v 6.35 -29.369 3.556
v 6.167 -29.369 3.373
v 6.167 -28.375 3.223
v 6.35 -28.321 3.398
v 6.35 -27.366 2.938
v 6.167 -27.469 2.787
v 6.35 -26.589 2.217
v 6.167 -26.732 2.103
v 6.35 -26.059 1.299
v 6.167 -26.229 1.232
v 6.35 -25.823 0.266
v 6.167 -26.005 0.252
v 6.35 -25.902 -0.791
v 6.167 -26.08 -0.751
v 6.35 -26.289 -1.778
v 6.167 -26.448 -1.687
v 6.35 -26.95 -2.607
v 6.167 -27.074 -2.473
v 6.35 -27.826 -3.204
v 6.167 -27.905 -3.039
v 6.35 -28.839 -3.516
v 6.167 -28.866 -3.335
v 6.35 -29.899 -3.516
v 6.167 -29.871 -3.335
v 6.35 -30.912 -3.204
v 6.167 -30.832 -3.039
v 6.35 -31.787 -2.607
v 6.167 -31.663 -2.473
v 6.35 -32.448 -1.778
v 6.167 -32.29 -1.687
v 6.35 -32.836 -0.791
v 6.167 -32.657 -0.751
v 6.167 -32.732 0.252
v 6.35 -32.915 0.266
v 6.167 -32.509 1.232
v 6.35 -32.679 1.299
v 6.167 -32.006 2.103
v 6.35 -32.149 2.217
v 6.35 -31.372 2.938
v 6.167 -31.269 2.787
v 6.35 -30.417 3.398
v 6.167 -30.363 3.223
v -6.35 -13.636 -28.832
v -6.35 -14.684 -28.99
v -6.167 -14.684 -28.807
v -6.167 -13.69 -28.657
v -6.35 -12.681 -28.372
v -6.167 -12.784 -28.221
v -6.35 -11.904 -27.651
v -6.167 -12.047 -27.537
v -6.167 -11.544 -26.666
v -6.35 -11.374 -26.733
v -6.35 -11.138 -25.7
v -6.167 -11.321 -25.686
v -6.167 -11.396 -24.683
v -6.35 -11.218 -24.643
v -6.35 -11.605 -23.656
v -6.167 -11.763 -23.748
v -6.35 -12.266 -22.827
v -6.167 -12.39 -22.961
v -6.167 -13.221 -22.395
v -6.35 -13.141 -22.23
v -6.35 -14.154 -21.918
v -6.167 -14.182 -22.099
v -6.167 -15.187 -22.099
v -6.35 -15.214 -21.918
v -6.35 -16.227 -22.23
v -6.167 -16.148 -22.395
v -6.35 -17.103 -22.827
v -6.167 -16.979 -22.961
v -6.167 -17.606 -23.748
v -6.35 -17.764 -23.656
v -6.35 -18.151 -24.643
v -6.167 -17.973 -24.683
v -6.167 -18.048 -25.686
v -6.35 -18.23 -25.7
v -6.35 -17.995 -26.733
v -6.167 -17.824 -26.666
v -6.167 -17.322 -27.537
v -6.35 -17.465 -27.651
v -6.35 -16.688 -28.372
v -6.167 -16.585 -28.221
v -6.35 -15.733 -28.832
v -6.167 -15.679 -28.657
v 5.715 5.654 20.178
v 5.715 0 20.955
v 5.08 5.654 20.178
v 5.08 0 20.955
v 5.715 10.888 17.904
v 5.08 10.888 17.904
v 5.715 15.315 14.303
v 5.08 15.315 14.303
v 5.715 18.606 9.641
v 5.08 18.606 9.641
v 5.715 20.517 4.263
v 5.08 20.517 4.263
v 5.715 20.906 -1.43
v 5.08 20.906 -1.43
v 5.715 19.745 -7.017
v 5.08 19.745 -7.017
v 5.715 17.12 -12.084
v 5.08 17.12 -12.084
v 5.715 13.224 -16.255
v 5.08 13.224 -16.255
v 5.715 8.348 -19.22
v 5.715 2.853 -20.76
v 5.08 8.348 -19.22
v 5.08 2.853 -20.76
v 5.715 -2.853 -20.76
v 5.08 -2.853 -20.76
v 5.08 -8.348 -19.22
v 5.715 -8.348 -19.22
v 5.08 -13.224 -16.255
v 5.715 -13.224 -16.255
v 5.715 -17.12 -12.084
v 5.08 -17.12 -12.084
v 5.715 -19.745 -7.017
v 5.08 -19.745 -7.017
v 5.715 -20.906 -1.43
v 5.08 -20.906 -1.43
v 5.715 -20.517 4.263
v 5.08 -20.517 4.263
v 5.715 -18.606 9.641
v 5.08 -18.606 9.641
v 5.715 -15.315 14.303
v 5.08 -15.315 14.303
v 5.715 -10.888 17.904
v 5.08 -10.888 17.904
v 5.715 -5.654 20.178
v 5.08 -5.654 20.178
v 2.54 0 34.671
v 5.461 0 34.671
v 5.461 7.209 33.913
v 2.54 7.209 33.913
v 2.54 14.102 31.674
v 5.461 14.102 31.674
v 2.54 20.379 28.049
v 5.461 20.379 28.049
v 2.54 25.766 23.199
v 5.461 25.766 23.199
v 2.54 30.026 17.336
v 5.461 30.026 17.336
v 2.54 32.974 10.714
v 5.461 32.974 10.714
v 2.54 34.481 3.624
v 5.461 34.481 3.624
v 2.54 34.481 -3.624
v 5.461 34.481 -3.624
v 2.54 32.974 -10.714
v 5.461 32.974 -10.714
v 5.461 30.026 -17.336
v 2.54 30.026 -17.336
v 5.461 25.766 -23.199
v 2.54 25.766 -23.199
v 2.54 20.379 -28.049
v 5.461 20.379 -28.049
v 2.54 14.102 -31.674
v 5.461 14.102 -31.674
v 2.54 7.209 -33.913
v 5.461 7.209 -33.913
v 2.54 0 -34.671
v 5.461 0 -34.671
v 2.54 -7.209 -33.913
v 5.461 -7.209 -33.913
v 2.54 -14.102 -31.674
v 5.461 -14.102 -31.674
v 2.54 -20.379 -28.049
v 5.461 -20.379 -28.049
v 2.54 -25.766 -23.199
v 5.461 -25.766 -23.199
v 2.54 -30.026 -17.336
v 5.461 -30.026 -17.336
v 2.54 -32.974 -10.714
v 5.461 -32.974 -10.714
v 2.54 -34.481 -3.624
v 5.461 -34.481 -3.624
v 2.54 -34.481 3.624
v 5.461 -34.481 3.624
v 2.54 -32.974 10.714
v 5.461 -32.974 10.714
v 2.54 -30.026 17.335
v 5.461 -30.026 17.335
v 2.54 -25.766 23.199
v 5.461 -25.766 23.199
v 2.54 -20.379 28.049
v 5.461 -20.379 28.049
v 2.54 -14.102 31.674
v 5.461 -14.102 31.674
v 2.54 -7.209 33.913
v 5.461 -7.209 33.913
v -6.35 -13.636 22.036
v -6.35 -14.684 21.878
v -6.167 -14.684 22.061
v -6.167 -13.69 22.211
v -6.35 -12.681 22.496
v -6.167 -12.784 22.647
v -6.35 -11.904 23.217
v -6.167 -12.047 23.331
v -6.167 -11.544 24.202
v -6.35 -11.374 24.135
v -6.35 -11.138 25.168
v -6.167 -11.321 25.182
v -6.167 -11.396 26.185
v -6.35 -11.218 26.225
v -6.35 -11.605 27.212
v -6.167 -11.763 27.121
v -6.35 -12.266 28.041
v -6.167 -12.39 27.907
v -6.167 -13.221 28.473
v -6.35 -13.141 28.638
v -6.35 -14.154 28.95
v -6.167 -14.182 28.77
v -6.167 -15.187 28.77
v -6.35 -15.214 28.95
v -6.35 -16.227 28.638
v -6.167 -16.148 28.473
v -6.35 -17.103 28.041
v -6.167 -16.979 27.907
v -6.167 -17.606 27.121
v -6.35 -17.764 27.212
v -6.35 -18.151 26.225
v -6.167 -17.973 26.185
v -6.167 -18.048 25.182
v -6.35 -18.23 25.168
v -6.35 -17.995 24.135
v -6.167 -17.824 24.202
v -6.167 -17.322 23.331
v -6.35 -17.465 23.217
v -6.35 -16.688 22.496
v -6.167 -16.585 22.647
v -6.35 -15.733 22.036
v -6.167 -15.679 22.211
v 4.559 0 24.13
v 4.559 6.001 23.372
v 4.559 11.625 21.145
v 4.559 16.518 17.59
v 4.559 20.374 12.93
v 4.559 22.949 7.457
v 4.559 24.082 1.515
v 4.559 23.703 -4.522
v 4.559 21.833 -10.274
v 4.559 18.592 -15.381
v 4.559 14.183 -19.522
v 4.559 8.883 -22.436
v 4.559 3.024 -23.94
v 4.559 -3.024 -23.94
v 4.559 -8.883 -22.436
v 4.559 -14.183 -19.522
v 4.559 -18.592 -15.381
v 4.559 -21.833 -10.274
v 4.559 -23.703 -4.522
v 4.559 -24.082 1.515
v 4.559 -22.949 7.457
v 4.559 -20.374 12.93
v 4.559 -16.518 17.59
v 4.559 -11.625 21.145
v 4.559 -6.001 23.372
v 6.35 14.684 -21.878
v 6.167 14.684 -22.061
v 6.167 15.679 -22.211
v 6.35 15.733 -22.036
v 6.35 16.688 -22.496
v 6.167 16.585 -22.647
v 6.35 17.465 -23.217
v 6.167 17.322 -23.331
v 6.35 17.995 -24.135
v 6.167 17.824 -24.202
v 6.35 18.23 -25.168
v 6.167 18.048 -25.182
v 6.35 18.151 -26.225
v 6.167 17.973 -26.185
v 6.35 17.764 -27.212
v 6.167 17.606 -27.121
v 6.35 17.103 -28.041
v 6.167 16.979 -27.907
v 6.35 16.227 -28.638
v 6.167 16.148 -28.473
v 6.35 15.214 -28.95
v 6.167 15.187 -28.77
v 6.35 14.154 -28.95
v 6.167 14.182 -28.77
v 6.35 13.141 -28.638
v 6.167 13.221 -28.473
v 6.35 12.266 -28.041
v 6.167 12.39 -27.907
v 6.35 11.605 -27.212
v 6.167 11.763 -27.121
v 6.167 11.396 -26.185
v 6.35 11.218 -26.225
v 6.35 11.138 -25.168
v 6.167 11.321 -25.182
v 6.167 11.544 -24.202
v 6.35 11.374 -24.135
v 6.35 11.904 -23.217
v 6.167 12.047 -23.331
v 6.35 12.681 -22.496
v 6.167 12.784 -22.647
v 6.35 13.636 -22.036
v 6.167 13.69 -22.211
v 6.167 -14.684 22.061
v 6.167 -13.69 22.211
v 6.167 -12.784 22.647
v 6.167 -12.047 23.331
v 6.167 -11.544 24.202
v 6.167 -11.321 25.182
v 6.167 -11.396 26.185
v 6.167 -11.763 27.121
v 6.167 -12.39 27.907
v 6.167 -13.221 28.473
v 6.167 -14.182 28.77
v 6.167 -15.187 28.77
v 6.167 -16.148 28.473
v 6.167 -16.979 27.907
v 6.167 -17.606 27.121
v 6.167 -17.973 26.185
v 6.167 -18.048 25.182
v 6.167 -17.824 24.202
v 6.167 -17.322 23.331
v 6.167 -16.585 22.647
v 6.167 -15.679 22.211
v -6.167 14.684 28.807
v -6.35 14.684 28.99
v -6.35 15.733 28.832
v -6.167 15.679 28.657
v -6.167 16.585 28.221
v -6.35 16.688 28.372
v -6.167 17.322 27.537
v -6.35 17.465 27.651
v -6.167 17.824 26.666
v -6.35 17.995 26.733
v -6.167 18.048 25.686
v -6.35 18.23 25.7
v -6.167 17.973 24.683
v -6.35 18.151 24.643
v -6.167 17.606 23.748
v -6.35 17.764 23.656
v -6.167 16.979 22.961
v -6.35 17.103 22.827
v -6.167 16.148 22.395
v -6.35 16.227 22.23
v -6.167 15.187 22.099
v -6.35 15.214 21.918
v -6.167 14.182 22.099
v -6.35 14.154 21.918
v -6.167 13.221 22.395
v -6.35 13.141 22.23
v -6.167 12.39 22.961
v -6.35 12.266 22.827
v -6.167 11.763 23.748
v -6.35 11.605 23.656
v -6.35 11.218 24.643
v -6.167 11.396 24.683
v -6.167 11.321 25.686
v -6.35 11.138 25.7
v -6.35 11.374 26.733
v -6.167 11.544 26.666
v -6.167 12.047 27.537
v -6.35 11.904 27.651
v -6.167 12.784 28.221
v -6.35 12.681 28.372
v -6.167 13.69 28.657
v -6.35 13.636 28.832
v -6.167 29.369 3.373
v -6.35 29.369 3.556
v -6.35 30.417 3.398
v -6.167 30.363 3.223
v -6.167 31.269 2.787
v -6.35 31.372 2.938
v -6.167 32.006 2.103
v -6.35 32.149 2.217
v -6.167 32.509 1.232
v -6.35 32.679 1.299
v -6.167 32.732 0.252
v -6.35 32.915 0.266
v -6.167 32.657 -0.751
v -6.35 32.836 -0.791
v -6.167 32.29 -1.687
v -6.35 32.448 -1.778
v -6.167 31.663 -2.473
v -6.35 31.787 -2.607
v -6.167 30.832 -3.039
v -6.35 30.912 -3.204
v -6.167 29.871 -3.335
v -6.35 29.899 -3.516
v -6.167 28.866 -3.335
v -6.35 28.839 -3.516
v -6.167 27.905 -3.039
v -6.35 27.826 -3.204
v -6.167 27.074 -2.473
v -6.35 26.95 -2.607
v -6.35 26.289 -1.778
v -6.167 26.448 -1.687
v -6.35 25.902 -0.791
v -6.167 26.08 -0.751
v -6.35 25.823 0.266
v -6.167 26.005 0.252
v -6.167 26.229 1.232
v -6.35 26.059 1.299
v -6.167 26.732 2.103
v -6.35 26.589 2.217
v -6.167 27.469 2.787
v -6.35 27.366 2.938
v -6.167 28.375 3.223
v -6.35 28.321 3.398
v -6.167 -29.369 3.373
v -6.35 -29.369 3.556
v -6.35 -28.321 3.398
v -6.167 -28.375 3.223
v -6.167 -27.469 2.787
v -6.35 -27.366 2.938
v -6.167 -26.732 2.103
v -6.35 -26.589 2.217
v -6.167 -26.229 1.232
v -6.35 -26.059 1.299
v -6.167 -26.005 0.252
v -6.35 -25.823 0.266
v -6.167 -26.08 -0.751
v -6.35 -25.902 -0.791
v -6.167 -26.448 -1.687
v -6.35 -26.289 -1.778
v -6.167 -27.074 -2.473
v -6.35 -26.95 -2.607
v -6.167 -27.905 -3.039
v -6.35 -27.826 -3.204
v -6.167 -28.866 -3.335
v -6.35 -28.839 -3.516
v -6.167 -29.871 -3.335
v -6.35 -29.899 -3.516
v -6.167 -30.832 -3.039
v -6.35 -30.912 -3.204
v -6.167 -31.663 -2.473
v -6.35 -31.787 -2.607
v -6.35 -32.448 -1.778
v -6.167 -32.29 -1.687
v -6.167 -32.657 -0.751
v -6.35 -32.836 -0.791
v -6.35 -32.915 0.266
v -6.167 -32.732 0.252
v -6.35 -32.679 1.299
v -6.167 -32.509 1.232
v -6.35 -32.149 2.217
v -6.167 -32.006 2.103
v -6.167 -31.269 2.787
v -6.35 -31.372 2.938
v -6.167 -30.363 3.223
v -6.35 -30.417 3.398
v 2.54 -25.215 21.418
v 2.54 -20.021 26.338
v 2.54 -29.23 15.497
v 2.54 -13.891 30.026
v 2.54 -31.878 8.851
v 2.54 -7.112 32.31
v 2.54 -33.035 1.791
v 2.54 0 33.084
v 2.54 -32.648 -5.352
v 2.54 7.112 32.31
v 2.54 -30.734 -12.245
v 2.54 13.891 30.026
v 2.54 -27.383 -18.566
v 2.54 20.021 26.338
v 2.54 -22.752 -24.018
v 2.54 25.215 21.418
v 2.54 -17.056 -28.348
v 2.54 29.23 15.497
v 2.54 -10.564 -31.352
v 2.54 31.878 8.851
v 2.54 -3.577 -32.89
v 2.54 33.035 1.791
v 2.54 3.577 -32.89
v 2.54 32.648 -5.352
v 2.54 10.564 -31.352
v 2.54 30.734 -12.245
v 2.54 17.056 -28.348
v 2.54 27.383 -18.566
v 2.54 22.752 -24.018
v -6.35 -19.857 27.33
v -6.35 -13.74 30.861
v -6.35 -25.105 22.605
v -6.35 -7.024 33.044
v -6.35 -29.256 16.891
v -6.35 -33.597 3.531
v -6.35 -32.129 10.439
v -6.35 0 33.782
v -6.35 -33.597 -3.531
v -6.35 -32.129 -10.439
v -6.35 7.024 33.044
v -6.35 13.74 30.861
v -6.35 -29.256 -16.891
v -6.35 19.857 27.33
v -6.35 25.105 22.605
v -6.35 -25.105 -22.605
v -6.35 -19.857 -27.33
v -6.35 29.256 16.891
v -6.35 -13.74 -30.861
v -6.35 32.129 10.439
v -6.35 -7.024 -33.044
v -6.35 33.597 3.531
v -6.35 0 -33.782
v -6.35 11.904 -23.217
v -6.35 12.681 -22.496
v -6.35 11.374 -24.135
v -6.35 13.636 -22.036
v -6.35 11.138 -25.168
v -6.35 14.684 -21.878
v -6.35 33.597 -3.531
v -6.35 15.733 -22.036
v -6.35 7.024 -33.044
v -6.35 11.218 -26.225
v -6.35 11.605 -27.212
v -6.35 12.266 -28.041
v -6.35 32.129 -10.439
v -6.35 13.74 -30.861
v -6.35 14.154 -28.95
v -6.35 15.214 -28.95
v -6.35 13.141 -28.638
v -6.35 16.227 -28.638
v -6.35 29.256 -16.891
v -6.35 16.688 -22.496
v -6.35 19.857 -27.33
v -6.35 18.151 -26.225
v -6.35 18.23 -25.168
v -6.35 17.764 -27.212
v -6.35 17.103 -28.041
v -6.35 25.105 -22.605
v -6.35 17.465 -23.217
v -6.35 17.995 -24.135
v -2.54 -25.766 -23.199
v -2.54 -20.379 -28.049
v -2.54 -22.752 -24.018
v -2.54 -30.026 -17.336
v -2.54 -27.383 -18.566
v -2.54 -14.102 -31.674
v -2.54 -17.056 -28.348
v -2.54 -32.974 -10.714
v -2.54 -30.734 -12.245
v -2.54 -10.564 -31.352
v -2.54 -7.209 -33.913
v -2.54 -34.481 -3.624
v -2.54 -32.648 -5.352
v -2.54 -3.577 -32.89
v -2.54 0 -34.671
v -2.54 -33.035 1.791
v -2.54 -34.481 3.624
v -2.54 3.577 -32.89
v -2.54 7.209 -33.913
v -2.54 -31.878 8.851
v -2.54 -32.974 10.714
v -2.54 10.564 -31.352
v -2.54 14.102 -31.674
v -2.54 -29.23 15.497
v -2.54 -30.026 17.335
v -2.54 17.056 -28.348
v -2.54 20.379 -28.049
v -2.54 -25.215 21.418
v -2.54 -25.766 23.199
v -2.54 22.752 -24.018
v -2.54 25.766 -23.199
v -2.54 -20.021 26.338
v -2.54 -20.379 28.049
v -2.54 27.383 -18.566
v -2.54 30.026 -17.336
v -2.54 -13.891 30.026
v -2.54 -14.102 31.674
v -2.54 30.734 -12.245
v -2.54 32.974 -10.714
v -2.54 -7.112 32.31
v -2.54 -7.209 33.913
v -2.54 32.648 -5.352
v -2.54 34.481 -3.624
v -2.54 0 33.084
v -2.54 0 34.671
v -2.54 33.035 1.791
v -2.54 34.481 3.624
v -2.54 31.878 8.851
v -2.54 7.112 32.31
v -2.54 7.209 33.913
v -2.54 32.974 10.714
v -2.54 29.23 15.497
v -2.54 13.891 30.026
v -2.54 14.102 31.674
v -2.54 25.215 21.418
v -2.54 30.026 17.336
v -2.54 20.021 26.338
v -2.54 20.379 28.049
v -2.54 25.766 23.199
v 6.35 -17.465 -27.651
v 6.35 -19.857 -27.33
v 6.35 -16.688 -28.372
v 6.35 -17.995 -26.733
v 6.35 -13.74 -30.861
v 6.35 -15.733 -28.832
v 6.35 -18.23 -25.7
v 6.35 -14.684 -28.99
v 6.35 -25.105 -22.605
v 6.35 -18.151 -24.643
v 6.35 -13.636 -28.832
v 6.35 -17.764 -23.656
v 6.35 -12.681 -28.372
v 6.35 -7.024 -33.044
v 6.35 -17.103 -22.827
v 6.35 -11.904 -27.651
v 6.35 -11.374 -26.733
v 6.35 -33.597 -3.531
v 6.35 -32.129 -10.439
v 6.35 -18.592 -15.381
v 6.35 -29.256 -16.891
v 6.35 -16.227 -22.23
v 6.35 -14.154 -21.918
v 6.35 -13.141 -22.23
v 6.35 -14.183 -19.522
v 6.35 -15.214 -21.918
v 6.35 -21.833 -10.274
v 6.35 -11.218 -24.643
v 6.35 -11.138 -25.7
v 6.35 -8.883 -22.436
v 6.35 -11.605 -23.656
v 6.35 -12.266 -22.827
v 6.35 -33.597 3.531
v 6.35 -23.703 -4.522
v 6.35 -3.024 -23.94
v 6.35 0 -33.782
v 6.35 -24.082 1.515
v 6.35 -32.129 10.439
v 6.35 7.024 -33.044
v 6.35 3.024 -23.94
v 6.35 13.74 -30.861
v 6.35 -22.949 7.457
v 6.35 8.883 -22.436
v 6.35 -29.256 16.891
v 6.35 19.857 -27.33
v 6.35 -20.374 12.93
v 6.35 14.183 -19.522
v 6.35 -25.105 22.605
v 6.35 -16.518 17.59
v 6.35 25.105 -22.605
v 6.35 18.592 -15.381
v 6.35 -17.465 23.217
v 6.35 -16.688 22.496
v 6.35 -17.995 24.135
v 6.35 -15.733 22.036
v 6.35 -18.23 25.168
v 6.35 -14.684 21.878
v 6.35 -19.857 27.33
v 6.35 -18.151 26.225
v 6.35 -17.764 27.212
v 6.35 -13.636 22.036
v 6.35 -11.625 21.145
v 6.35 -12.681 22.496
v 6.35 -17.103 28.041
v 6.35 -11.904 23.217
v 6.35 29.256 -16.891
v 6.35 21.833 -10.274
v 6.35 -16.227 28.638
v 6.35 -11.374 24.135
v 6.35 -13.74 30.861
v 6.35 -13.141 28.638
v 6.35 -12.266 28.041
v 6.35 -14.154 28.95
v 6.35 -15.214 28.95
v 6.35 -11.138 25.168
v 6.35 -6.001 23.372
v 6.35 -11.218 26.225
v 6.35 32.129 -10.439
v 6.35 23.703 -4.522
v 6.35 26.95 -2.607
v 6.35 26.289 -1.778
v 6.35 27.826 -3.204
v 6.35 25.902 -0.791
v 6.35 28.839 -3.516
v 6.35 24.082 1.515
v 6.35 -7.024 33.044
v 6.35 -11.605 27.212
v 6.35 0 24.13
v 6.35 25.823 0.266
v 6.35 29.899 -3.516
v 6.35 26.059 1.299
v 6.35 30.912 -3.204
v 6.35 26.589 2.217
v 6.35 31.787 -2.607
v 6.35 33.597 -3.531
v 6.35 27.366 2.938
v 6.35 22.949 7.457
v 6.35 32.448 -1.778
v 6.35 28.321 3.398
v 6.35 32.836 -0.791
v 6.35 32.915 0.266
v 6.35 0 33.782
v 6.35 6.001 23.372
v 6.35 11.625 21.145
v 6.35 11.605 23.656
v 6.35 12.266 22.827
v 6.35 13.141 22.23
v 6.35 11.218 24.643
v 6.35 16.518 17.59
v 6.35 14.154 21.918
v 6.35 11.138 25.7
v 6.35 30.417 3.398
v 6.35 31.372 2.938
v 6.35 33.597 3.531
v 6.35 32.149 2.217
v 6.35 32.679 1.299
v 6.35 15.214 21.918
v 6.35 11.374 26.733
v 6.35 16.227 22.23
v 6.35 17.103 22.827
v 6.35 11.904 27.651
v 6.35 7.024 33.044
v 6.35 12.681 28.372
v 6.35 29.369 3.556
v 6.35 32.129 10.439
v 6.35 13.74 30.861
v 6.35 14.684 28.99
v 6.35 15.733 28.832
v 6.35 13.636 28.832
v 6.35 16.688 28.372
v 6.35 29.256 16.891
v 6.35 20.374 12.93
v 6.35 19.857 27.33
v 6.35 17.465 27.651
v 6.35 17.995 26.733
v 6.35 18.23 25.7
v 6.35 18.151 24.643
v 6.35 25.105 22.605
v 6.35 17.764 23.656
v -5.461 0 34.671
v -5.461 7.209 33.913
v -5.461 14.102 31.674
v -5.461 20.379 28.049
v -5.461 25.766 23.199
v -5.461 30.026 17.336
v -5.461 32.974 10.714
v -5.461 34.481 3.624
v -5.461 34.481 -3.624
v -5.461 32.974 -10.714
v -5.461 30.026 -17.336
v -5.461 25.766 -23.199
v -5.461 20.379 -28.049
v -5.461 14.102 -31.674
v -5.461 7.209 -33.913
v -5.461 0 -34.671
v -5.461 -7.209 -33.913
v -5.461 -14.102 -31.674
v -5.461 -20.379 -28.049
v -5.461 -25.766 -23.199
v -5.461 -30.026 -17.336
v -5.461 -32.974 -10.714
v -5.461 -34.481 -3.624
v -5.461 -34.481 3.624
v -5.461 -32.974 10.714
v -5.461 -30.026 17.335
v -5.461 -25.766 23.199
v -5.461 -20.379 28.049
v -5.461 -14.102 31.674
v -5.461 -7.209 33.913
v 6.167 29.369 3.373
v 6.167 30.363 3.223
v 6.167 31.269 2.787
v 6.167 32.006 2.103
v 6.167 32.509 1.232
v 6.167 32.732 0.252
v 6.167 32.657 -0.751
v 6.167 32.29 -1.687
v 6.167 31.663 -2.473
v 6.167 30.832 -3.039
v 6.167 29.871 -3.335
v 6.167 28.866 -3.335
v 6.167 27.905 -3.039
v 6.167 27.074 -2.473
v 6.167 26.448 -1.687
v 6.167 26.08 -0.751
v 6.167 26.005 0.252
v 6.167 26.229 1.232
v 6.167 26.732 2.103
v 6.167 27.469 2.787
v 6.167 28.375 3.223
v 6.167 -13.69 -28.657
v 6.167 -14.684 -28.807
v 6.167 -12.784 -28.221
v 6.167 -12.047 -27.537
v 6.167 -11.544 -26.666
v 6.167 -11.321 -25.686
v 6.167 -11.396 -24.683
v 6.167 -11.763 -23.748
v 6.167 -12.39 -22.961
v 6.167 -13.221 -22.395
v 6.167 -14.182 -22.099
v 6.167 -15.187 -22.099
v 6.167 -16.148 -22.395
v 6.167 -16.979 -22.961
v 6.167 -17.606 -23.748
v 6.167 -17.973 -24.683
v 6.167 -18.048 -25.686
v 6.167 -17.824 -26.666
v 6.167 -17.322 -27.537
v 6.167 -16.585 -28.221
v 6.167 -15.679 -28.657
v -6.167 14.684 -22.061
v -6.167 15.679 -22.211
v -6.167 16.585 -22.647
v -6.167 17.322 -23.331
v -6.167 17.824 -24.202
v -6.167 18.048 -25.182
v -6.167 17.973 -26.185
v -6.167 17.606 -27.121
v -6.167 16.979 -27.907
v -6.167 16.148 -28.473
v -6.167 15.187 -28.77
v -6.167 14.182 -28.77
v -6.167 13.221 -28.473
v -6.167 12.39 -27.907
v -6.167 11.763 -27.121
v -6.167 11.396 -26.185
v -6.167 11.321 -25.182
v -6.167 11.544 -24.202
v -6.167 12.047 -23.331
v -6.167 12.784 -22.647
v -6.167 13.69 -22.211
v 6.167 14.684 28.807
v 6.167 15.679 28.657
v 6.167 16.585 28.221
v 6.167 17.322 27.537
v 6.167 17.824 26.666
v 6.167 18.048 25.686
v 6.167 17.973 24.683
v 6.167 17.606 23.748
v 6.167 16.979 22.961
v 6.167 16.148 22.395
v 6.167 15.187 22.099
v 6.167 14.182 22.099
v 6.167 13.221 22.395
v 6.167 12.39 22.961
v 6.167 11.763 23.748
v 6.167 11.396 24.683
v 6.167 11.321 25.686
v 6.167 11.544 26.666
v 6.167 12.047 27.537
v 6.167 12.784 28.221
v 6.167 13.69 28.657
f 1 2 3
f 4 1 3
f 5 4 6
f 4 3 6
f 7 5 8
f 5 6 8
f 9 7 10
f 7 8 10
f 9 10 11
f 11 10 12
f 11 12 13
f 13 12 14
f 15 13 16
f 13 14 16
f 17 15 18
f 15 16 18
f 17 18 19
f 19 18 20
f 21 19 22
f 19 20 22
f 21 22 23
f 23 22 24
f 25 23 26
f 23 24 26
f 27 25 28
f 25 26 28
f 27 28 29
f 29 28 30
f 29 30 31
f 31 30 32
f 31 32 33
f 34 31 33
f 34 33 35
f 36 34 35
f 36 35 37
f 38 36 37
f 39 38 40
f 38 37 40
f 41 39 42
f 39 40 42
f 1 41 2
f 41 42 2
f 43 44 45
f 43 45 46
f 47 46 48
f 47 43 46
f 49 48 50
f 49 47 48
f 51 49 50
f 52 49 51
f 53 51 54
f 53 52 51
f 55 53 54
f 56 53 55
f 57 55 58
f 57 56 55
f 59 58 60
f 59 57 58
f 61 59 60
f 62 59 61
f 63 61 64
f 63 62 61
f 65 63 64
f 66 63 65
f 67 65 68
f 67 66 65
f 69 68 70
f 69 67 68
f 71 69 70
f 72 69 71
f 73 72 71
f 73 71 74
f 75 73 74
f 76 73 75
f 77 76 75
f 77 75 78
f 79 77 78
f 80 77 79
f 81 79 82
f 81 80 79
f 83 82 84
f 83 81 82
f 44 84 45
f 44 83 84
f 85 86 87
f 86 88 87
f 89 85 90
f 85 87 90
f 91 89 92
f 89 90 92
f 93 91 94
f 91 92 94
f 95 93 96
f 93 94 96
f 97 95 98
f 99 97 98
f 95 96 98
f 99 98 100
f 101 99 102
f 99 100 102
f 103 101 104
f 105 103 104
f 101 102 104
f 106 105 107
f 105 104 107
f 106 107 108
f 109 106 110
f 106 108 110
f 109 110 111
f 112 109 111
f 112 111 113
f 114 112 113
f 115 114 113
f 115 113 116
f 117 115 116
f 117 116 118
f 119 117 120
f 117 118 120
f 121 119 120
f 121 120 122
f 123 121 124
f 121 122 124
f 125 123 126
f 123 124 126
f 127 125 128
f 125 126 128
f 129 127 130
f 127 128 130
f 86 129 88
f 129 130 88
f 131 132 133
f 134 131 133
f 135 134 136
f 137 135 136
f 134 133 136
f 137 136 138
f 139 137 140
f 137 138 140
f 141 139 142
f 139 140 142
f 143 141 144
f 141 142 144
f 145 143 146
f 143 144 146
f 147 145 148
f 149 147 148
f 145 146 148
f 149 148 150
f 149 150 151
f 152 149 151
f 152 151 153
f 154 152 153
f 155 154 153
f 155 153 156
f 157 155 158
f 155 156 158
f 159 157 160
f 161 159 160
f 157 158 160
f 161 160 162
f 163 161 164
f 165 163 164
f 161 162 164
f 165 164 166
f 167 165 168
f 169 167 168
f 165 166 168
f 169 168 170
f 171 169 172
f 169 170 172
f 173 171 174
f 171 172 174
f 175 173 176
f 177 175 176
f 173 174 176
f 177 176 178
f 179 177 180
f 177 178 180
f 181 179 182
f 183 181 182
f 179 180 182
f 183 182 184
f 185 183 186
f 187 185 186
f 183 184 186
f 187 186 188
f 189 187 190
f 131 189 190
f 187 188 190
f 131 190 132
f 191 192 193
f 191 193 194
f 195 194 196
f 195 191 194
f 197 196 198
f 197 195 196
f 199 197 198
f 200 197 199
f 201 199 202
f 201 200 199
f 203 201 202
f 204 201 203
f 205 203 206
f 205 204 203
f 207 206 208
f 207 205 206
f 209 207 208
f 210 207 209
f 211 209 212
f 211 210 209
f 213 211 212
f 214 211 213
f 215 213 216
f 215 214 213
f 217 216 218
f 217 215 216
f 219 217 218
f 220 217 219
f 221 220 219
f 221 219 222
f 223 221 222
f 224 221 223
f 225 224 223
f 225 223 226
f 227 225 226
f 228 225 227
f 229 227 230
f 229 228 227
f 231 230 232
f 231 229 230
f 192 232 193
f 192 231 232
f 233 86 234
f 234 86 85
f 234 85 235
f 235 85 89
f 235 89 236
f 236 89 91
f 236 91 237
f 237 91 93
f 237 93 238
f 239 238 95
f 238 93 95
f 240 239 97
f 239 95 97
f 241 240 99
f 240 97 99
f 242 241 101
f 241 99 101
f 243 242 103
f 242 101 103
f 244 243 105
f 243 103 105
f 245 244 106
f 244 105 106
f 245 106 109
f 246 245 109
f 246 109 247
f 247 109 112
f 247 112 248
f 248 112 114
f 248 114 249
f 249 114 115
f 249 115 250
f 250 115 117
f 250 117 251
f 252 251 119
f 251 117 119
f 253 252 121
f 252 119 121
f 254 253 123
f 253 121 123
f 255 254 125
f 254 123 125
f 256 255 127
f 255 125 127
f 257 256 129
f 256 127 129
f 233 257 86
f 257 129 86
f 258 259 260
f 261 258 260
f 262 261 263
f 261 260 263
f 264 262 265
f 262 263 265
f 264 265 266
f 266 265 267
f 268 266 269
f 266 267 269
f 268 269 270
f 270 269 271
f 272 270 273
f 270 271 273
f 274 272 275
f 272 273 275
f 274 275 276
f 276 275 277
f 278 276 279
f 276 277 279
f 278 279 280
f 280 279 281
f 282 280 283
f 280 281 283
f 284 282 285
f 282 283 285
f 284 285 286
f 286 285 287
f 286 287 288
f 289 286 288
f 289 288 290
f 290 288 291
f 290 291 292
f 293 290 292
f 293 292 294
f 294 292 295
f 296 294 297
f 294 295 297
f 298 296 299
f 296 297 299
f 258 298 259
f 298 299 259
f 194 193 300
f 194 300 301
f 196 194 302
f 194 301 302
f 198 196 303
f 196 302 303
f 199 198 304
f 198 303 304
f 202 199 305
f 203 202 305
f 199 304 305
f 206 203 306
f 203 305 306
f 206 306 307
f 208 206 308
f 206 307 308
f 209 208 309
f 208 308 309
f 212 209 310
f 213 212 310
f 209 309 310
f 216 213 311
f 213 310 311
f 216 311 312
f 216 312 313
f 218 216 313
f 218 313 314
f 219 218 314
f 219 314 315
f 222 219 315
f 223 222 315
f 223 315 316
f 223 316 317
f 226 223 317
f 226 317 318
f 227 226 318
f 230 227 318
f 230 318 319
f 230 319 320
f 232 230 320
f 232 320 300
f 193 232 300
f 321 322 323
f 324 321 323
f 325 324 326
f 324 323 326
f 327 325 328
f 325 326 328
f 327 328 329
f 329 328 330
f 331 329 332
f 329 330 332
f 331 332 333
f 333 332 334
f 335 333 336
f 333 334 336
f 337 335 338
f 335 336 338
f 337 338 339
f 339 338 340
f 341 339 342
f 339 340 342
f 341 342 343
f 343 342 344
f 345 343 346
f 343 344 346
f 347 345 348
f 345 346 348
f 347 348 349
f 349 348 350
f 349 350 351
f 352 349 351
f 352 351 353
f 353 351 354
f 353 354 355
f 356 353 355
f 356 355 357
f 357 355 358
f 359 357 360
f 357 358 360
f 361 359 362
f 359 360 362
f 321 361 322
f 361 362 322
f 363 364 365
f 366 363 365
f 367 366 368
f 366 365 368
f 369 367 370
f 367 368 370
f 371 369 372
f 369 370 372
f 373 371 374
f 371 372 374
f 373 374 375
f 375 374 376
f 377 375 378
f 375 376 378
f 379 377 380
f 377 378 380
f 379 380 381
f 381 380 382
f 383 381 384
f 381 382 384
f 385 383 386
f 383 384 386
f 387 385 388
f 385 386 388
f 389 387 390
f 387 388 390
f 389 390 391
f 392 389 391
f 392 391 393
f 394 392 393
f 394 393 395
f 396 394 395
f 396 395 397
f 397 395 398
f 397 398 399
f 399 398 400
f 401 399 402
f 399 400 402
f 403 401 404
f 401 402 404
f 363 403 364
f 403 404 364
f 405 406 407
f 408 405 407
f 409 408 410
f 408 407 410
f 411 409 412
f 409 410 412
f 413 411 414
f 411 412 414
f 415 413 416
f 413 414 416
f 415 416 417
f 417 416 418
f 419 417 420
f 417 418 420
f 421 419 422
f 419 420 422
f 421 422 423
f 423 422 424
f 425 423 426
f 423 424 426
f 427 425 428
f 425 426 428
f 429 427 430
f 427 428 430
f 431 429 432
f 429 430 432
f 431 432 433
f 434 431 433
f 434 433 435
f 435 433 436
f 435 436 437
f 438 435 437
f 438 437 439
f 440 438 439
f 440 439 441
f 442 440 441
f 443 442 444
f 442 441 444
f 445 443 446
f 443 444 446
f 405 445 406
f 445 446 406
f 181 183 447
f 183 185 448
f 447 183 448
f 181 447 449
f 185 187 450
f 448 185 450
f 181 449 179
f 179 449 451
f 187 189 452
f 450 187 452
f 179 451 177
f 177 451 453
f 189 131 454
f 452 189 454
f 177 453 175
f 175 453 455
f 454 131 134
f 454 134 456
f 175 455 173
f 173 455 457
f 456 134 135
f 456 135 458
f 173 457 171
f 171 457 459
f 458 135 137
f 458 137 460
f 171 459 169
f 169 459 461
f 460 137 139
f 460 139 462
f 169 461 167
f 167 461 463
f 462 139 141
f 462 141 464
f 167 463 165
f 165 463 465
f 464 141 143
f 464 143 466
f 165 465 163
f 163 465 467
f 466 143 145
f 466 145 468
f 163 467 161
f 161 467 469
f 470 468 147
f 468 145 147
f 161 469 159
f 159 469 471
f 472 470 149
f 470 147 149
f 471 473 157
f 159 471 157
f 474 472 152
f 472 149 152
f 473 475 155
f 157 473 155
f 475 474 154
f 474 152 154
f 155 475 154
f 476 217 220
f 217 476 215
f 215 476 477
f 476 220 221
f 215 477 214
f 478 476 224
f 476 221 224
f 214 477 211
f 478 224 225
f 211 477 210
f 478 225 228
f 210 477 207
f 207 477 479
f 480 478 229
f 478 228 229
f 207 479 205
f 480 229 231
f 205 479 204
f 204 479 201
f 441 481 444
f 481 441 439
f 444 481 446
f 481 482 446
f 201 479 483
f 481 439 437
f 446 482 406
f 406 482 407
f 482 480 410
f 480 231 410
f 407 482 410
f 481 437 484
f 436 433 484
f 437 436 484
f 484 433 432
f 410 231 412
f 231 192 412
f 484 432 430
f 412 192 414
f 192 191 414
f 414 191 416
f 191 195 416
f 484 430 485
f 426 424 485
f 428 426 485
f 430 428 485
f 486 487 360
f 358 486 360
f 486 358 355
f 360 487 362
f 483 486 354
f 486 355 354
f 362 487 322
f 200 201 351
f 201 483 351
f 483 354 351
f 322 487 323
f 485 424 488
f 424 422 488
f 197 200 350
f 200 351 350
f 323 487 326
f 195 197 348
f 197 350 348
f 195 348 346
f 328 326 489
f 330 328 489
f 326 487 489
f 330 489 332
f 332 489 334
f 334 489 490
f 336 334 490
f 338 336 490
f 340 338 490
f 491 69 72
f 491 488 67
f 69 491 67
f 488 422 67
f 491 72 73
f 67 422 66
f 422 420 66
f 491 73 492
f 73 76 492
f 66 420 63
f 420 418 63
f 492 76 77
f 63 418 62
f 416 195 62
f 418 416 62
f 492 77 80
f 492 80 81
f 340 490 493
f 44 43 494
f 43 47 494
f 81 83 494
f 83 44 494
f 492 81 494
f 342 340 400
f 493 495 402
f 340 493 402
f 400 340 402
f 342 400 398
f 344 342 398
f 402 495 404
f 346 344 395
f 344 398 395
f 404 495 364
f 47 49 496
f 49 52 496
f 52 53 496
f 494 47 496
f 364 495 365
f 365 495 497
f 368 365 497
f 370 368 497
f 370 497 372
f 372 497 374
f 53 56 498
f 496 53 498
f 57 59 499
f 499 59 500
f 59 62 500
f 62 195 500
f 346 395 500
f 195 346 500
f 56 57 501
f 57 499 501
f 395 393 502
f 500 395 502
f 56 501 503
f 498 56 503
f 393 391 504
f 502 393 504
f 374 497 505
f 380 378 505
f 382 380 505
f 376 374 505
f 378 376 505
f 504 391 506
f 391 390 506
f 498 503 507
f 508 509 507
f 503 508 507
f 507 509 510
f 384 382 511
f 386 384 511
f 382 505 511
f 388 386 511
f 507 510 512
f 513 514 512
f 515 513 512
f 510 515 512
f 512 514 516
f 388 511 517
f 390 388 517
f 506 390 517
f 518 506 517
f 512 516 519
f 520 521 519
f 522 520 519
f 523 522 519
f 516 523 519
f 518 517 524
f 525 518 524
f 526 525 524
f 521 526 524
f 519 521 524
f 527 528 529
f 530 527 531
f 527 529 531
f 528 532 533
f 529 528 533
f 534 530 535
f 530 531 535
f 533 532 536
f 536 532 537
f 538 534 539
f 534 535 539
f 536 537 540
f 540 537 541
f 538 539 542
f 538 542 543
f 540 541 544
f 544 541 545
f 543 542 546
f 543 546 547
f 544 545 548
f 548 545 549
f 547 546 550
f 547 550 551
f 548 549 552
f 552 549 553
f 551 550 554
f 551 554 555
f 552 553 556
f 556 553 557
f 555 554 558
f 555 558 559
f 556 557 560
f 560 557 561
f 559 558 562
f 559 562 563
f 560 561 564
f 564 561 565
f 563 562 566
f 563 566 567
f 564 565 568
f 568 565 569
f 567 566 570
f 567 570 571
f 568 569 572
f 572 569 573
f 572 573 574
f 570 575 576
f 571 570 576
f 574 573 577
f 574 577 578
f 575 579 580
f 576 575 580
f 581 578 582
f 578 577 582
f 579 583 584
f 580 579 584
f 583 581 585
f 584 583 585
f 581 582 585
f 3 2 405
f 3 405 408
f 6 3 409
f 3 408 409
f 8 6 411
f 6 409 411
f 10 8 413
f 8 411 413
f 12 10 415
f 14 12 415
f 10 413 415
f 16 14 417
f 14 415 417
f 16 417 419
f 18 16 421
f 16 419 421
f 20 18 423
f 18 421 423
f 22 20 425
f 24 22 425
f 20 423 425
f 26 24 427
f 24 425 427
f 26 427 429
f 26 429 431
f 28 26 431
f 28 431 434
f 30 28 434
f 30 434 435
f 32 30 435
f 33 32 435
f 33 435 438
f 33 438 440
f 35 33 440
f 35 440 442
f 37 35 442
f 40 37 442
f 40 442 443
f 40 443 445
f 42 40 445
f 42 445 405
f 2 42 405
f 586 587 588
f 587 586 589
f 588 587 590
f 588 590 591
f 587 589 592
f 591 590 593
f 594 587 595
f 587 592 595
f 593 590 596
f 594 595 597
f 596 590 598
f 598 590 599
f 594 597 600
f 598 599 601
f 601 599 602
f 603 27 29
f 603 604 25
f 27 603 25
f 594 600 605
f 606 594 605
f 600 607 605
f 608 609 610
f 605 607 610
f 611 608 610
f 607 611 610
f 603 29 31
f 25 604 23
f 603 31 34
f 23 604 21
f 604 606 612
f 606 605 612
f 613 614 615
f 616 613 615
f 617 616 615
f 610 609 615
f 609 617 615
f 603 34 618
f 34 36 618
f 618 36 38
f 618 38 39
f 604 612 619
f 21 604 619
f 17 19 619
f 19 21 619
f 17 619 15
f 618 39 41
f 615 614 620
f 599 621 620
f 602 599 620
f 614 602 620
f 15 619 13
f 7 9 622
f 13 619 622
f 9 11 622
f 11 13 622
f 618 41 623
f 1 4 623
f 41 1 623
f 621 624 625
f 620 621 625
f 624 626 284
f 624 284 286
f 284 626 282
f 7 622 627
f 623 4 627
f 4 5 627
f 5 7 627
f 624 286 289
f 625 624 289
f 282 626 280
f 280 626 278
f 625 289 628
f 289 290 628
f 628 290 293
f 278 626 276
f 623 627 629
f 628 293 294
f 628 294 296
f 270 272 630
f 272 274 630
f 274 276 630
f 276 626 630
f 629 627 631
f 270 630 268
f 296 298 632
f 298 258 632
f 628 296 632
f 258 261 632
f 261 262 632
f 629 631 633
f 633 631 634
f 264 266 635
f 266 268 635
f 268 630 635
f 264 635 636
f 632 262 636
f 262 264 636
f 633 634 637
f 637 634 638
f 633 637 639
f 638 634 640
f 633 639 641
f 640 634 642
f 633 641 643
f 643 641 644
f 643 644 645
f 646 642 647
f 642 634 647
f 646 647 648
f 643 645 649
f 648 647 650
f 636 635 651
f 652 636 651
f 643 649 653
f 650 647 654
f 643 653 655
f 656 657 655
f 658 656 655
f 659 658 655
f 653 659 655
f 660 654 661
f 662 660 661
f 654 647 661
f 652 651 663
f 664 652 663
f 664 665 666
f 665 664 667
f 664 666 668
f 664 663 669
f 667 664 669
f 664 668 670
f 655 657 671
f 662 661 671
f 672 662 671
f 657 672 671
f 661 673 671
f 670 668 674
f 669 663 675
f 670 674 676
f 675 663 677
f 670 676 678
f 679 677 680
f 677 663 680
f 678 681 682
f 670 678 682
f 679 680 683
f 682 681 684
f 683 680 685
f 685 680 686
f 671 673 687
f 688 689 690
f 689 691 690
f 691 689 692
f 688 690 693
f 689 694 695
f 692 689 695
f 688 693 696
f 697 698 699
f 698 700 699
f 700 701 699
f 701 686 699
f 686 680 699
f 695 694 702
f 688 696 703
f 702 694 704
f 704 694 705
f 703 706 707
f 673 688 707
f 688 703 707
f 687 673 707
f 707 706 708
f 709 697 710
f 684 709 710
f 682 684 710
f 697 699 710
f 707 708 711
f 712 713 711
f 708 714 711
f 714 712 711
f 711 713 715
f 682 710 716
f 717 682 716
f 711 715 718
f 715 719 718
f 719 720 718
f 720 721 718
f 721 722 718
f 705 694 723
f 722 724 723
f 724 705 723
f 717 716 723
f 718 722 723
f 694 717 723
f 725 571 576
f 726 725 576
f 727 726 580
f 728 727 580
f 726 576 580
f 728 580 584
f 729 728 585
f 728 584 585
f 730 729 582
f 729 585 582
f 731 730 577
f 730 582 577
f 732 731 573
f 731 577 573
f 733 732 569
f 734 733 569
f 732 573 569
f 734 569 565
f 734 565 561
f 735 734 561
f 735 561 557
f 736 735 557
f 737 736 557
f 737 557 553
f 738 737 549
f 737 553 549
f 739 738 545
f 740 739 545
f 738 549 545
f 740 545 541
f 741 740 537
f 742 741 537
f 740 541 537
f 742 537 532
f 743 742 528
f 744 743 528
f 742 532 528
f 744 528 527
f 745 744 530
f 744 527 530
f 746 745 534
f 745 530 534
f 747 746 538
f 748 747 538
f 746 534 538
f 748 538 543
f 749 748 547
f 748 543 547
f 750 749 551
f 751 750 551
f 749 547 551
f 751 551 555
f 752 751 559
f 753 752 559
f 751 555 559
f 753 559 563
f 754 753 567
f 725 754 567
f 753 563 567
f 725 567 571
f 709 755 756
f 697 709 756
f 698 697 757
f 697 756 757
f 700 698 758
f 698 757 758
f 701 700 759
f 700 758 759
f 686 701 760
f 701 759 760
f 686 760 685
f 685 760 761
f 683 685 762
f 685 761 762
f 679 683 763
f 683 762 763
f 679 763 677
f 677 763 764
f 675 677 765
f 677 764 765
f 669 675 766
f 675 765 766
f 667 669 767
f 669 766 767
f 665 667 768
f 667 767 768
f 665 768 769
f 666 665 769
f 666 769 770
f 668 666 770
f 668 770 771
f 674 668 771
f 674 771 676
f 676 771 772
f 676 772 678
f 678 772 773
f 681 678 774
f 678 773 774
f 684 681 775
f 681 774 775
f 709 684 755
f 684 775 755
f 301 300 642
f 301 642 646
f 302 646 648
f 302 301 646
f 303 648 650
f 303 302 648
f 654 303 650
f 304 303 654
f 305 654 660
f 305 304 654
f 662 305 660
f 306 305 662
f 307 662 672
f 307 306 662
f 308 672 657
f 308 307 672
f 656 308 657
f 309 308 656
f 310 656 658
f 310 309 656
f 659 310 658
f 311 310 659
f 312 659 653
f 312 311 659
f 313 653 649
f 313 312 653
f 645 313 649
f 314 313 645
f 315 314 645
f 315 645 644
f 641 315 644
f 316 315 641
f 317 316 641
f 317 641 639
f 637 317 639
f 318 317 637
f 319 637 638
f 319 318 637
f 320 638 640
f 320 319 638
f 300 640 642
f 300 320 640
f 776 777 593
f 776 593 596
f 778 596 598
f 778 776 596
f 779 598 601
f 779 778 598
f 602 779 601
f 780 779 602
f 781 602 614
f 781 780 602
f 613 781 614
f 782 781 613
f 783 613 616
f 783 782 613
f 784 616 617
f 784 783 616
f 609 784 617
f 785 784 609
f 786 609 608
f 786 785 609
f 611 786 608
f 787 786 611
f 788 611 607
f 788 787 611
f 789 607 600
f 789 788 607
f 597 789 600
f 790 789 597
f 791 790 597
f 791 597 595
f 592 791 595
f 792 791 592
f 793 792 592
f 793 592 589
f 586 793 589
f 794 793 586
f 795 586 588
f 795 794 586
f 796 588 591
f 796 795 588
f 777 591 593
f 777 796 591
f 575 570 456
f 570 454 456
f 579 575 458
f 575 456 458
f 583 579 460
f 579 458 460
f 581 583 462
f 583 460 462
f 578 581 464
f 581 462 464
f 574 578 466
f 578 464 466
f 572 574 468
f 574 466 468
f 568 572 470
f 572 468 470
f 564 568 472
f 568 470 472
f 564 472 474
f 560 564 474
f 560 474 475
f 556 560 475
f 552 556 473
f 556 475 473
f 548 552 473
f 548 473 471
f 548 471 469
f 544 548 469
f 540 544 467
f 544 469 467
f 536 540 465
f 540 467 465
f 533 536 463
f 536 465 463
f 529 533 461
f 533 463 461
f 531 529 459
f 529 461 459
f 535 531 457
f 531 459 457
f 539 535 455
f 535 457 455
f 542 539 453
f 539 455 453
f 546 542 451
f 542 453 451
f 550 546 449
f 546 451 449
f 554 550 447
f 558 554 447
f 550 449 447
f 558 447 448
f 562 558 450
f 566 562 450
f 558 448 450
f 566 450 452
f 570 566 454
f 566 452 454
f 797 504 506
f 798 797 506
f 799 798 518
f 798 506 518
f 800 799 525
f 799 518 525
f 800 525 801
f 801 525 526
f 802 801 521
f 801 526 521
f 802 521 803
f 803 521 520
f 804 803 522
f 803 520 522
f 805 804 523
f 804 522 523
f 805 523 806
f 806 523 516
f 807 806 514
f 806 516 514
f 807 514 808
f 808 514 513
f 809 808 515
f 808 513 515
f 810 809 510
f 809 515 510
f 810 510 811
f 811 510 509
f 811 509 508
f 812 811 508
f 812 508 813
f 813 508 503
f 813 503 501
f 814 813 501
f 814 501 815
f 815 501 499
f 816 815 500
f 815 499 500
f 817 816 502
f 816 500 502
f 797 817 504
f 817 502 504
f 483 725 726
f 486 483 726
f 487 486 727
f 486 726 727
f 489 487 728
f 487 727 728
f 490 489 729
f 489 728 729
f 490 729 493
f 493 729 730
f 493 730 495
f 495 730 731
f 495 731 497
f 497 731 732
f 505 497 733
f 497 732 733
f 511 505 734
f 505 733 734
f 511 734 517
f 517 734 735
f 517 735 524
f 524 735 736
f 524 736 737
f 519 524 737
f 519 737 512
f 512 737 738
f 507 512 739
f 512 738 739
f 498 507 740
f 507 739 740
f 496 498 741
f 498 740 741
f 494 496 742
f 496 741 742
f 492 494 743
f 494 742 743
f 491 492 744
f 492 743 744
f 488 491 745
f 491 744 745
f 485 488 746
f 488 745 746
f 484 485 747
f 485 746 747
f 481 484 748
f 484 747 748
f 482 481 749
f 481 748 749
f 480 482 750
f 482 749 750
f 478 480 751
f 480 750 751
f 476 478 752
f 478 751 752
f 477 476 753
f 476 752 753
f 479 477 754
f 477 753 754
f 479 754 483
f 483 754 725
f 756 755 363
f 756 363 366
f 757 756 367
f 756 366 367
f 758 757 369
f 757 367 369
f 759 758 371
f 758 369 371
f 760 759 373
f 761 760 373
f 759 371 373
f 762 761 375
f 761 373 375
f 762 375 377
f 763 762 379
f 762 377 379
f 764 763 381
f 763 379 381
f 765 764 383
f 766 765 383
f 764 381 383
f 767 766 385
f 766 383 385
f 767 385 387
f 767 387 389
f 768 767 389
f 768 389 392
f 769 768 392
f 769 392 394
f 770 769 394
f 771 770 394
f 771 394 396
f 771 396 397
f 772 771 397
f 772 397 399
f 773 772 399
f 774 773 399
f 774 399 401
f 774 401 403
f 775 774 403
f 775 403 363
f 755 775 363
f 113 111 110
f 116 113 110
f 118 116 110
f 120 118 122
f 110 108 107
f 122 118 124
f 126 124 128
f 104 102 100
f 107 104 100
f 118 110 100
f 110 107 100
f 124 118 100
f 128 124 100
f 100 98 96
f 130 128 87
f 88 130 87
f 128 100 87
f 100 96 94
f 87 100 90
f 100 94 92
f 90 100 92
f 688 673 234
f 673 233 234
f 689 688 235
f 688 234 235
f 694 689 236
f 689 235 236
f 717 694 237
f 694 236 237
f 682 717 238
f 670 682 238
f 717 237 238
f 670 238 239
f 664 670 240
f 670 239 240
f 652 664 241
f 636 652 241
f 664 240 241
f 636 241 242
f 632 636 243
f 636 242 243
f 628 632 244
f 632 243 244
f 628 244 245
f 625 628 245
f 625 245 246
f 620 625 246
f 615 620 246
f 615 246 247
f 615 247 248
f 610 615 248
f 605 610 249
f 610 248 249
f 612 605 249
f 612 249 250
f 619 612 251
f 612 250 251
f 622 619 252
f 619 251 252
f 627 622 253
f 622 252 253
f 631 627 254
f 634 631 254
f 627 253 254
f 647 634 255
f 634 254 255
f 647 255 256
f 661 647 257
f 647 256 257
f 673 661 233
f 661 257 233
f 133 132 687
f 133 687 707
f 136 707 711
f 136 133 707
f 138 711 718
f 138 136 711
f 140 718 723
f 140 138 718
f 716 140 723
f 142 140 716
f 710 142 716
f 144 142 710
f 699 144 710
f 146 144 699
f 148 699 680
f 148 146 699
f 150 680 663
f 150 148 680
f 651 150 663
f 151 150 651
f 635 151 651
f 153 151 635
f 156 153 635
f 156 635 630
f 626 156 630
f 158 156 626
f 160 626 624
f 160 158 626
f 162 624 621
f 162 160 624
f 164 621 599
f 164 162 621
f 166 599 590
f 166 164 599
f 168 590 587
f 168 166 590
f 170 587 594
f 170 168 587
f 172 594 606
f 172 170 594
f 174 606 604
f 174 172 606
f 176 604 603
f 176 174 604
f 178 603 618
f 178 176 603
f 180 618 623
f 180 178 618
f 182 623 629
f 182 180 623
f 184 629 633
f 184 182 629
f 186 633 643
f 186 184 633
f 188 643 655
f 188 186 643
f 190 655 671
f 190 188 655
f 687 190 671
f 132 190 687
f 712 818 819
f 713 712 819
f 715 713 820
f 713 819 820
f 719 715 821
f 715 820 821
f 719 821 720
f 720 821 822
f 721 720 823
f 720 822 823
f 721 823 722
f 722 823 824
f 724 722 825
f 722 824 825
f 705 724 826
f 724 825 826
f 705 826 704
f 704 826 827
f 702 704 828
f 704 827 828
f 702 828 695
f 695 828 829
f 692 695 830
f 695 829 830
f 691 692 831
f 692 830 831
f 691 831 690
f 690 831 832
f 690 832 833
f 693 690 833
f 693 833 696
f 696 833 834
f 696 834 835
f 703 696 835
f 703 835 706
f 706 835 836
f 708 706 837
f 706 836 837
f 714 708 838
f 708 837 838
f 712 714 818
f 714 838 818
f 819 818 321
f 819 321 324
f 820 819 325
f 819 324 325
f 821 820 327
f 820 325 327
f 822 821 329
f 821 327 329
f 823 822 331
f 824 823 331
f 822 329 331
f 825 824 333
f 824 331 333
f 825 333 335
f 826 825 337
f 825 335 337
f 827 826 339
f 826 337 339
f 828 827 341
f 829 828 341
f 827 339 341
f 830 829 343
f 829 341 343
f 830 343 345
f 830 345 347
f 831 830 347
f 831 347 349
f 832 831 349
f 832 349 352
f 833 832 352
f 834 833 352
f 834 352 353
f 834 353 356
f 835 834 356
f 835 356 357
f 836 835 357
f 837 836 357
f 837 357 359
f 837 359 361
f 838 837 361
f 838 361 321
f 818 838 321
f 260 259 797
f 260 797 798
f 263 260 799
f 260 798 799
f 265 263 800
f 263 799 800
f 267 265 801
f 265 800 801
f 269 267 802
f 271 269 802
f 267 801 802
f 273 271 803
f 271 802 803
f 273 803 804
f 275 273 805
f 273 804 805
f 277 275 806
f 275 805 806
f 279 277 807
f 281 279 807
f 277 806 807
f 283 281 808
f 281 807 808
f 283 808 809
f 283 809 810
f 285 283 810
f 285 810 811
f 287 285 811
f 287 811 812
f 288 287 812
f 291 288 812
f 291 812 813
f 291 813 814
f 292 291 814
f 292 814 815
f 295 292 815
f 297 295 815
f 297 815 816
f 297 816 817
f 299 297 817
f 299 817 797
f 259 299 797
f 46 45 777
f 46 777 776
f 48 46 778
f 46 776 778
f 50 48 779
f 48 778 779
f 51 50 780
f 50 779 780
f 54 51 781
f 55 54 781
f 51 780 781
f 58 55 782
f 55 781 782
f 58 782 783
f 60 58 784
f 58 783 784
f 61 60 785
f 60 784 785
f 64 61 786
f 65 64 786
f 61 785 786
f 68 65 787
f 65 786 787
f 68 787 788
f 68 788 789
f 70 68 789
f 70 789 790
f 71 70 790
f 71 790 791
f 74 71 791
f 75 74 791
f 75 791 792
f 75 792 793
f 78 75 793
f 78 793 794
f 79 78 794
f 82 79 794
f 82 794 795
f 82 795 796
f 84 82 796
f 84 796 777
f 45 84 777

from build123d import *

# Parameters (mm, degrees)
M6_CLEARANCE_HOLE1_D = 6.74624
M6_CLEARANCE_HOLE2_D = 6.74624
CHAMFER1_SIZE        = 0.18288
CHAMFER2_SIZE        = 0.889


with BuildPart() as part:
    # Sketch1 → Revolve1 (revolve)
    with BuildSketch(Plane(origin=(0, 0, 0), x_dir=(-1, 0, 0), z_dir=(0, 0, -1)), mode=Mode.PRIVATE) as revolve1_sk:
        Polygon((-5.08, 20.955), (-5.08, 0), (6.35, 0), (6.35, 34.671), (2.54, 34.671), (2.54, 33.0835), (-2.54, 33.0835), (-2.54, 34.671), (-6.35, 34.671), (-6.35, 24.13), (-4.559394506, 24.13), (-5.715, 20.955), align=None)
    revolve(revolve1_sk.sketch.rotate(Axis((6.35, 0, 0), (-1, 0, 0)), 270), axis=Axis((6.35, 0, 0), (-1, 0, 0)))

    # M6 Clearance Hole1 (through all)
    with Locations(Plane(origin=(6.35, 0, 0), x_dir=(0, 0, -1), z_dir=(1, 0, 0))):
        with Locations((0, 29.36875), (25.434083577, 14.684375), (0, -29.36875), (-25.434083577, 14.684375)):
            Hole(M6_CLEARANCE_HOLE1_D / 2)

    # M6 Clearance Hole2 (through all)
    with Locations(Plane.ZY.offset(6.35)):
        with Locations((25.434083577, -14.684375), (-25.434083577, -14.684375)):
            Hole(M6_CLEARANCE_HOLE2_D / 2)

    # Chamfer1
    chamfer1_edges = [part.edges().sort_by_distance(p)[0] for p in [
        (6.35, 14.684375, 22.060963577),
        (-6.35, 14.684375, 22.060963577),
        (6.35, -29.36875, -3.37312),
        (-6.35, -29.36875, -3.37312),
        (6.35, 14.684375, -28.807203577),
        (-6.35, 14.684375, -28.807203577),
        (6.35, 29.36875, -3.37312),
        (-6.35, 29.36875, -3.37312),
        (-6.35, -14.684375, -22.060963577),
        (6.35, -14.684375, -22.060963577),
        (-6.35, -14.684375, 28.807203577),
        (6.35, -14.684375, 28.807203577),
    ]]
    chamfer(chamfer1_edges, length=CHAMFER1_SIZE)

    # Chamfer2
    chamfer2_edges = [part.edges().sort_by_distance(p)[0] for p in [
        (6.35, 0, -34.671),
        (-6.35, 0, -34.671),
    ]]
    chamfer(chamfer2_edges, length=CHAMFER2_SIZE)


solid = part.part
